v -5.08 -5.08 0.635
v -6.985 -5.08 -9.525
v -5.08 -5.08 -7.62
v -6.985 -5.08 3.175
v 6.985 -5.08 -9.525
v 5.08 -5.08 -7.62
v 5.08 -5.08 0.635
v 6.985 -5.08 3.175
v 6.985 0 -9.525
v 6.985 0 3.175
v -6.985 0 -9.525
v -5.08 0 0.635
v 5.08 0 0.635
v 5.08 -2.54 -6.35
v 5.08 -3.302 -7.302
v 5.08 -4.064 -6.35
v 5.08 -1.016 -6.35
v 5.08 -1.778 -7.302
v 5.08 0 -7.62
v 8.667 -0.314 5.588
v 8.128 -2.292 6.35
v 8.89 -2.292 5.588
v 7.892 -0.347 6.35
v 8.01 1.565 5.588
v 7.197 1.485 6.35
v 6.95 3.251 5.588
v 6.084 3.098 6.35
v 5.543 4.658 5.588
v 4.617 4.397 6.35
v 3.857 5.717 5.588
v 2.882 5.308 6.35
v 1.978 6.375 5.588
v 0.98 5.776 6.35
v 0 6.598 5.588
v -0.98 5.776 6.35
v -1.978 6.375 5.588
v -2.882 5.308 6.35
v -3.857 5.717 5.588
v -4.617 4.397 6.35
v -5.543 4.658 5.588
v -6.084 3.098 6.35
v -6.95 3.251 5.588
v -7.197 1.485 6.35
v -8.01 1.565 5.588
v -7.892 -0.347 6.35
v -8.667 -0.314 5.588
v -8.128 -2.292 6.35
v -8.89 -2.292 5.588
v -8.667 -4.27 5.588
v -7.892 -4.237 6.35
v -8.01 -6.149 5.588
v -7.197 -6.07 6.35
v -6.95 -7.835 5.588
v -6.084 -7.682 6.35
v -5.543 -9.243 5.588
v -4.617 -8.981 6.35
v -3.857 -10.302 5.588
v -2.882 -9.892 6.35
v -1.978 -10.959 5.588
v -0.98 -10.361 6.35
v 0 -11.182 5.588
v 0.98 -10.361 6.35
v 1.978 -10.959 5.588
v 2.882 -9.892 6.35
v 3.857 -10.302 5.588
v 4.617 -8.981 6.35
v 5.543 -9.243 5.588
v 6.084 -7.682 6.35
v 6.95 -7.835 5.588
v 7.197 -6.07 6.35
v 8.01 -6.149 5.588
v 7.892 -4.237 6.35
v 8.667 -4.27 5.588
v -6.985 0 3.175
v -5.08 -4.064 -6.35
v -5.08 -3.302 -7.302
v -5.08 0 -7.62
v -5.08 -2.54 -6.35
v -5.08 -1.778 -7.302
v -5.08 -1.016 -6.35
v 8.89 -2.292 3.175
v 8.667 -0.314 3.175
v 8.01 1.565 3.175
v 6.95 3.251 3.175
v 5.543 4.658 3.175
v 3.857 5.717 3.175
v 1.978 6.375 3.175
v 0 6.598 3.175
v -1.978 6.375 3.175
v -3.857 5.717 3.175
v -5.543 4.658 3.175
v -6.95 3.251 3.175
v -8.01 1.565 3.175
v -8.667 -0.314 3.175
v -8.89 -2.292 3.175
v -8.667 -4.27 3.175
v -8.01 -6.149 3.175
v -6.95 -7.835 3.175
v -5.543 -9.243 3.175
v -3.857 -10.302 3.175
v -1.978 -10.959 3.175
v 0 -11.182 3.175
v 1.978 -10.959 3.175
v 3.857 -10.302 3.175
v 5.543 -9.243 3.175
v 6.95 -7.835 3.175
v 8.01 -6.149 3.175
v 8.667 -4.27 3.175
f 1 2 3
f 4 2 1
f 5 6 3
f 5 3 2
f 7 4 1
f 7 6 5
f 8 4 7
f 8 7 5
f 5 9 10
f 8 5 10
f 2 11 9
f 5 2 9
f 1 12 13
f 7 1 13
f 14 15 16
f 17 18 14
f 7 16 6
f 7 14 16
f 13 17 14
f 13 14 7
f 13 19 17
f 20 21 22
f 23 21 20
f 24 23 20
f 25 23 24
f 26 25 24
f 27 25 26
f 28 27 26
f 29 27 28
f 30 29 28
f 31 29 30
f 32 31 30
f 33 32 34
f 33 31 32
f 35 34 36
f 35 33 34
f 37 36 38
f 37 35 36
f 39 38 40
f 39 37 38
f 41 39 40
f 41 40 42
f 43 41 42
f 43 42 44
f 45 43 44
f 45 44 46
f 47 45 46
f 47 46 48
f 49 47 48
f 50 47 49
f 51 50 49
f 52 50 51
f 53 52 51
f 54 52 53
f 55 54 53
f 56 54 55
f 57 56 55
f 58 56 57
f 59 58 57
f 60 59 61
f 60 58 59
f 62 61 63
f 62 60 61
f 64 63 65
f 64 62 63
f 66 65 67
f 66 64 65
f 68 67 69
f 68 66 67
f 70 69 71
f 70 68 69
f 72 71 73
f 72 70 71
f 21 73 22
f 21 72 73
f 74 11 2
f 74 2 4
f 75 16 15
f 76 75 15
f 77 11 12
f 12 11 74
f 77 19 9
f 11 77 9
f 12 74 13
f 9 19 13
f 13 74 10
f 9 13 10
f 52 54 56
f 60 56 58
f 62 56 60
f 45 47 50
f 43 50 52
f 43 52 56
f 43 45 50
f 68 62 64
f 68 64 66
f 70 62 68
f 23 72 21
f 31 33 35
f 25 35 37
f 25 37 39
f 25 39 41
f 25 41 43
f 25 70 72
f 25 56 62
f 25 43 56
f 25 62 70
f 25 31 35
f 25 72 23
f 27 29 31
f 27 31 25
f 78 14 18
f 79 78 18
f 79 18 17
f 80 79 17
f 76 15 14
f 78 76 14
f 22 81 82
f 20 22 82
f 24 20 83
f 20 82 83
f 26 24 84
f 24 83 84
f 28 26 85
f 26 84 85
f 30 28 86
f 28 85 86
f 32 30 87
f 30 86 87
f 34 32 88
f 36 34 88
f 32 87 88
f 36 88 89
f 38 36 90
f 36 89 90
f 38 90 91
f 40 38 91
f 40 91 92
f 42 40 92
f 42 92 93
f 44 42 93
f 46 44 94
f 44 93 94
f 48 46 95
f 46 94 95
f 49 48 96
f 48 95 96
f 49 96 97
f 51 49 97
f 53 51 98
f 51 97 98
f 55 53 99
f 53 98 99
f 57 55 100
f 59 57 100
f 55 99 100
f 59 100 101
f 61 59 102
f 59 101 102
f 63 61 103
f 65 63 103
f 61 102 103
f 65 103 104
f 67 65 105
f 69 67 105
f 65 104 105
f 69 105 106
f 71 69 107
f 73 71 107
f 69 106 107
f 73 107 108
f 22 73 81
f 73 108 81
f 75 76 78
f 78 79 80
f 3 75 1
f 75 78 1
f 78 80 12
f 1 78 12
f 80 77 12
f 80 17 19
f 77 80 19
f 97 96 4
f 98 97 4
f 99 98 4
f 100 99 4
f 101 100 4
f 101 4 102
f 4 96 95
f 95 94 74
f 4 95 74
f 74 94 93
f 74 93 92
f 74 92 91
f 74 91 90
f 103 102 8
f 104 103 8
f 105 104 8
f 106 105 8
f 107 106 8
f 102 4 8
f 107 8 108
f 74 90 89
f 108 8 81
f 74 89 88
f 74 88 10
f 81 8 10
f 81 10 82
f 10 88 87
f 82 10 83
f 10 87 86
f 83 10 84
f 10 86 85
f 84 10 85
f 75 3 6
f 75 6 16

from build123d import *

# Parameters (mm, degrees)
F0_W     = 13.97
F0_H     = 12.7
F0_W_2   = 10.16
F0_H_2   = 8.255
F1_DEPTH = 5.08
F2_R     = 8.89
F3_DEPTH = 3.175
F4_SIZE  = 0.762
F6_DEPTH = 10.16


with BuildPart() as f1:
    # F0 (on Front) → F1 (new body)
    with BuildSketch(Plane.XZ):
        with Locations((0, -3.175)):
            Rectangle(F0_W, F0_H)
        with Locations((0, -3.4925)):
            Rectangle(F0_W_2, F0_H_2, mode=Mode.SUBTRACT)
    extrude(amount=F1_DEPTH)

    # F2 (on face) → F3 (join)
    with BuildSketch(Plane.XY.offset(3.175)):
        with Locations((0, -2.292242)):
            Circle(F2_R)
    extrude(amount=F3_DEPTH)

    # F4
    f4_edges = [f1.edges().sort_by_distance(p)[0] for p in [
        (-8.89, -2.292242, 6.35),
    ]]
    chamfer(f4_edges, length=F4_SIZE)

    # F5 (on face) → F6 (join)
    with BuildSketch(Plane(origin=(5.08, 0, 0), x_dir=(0, -1, 0), z_dir=(-1, 0, 0))):
        Polygon((0, -7.62), (5.08, -7.62), (4.064, -6.35), (3.302, -7.3025), (2.54, -6.35), (1.778, -7.3025), (1.016, -6.35), align=None)
    extrude(amount=F6_DEPTH)


solid = f1.part
